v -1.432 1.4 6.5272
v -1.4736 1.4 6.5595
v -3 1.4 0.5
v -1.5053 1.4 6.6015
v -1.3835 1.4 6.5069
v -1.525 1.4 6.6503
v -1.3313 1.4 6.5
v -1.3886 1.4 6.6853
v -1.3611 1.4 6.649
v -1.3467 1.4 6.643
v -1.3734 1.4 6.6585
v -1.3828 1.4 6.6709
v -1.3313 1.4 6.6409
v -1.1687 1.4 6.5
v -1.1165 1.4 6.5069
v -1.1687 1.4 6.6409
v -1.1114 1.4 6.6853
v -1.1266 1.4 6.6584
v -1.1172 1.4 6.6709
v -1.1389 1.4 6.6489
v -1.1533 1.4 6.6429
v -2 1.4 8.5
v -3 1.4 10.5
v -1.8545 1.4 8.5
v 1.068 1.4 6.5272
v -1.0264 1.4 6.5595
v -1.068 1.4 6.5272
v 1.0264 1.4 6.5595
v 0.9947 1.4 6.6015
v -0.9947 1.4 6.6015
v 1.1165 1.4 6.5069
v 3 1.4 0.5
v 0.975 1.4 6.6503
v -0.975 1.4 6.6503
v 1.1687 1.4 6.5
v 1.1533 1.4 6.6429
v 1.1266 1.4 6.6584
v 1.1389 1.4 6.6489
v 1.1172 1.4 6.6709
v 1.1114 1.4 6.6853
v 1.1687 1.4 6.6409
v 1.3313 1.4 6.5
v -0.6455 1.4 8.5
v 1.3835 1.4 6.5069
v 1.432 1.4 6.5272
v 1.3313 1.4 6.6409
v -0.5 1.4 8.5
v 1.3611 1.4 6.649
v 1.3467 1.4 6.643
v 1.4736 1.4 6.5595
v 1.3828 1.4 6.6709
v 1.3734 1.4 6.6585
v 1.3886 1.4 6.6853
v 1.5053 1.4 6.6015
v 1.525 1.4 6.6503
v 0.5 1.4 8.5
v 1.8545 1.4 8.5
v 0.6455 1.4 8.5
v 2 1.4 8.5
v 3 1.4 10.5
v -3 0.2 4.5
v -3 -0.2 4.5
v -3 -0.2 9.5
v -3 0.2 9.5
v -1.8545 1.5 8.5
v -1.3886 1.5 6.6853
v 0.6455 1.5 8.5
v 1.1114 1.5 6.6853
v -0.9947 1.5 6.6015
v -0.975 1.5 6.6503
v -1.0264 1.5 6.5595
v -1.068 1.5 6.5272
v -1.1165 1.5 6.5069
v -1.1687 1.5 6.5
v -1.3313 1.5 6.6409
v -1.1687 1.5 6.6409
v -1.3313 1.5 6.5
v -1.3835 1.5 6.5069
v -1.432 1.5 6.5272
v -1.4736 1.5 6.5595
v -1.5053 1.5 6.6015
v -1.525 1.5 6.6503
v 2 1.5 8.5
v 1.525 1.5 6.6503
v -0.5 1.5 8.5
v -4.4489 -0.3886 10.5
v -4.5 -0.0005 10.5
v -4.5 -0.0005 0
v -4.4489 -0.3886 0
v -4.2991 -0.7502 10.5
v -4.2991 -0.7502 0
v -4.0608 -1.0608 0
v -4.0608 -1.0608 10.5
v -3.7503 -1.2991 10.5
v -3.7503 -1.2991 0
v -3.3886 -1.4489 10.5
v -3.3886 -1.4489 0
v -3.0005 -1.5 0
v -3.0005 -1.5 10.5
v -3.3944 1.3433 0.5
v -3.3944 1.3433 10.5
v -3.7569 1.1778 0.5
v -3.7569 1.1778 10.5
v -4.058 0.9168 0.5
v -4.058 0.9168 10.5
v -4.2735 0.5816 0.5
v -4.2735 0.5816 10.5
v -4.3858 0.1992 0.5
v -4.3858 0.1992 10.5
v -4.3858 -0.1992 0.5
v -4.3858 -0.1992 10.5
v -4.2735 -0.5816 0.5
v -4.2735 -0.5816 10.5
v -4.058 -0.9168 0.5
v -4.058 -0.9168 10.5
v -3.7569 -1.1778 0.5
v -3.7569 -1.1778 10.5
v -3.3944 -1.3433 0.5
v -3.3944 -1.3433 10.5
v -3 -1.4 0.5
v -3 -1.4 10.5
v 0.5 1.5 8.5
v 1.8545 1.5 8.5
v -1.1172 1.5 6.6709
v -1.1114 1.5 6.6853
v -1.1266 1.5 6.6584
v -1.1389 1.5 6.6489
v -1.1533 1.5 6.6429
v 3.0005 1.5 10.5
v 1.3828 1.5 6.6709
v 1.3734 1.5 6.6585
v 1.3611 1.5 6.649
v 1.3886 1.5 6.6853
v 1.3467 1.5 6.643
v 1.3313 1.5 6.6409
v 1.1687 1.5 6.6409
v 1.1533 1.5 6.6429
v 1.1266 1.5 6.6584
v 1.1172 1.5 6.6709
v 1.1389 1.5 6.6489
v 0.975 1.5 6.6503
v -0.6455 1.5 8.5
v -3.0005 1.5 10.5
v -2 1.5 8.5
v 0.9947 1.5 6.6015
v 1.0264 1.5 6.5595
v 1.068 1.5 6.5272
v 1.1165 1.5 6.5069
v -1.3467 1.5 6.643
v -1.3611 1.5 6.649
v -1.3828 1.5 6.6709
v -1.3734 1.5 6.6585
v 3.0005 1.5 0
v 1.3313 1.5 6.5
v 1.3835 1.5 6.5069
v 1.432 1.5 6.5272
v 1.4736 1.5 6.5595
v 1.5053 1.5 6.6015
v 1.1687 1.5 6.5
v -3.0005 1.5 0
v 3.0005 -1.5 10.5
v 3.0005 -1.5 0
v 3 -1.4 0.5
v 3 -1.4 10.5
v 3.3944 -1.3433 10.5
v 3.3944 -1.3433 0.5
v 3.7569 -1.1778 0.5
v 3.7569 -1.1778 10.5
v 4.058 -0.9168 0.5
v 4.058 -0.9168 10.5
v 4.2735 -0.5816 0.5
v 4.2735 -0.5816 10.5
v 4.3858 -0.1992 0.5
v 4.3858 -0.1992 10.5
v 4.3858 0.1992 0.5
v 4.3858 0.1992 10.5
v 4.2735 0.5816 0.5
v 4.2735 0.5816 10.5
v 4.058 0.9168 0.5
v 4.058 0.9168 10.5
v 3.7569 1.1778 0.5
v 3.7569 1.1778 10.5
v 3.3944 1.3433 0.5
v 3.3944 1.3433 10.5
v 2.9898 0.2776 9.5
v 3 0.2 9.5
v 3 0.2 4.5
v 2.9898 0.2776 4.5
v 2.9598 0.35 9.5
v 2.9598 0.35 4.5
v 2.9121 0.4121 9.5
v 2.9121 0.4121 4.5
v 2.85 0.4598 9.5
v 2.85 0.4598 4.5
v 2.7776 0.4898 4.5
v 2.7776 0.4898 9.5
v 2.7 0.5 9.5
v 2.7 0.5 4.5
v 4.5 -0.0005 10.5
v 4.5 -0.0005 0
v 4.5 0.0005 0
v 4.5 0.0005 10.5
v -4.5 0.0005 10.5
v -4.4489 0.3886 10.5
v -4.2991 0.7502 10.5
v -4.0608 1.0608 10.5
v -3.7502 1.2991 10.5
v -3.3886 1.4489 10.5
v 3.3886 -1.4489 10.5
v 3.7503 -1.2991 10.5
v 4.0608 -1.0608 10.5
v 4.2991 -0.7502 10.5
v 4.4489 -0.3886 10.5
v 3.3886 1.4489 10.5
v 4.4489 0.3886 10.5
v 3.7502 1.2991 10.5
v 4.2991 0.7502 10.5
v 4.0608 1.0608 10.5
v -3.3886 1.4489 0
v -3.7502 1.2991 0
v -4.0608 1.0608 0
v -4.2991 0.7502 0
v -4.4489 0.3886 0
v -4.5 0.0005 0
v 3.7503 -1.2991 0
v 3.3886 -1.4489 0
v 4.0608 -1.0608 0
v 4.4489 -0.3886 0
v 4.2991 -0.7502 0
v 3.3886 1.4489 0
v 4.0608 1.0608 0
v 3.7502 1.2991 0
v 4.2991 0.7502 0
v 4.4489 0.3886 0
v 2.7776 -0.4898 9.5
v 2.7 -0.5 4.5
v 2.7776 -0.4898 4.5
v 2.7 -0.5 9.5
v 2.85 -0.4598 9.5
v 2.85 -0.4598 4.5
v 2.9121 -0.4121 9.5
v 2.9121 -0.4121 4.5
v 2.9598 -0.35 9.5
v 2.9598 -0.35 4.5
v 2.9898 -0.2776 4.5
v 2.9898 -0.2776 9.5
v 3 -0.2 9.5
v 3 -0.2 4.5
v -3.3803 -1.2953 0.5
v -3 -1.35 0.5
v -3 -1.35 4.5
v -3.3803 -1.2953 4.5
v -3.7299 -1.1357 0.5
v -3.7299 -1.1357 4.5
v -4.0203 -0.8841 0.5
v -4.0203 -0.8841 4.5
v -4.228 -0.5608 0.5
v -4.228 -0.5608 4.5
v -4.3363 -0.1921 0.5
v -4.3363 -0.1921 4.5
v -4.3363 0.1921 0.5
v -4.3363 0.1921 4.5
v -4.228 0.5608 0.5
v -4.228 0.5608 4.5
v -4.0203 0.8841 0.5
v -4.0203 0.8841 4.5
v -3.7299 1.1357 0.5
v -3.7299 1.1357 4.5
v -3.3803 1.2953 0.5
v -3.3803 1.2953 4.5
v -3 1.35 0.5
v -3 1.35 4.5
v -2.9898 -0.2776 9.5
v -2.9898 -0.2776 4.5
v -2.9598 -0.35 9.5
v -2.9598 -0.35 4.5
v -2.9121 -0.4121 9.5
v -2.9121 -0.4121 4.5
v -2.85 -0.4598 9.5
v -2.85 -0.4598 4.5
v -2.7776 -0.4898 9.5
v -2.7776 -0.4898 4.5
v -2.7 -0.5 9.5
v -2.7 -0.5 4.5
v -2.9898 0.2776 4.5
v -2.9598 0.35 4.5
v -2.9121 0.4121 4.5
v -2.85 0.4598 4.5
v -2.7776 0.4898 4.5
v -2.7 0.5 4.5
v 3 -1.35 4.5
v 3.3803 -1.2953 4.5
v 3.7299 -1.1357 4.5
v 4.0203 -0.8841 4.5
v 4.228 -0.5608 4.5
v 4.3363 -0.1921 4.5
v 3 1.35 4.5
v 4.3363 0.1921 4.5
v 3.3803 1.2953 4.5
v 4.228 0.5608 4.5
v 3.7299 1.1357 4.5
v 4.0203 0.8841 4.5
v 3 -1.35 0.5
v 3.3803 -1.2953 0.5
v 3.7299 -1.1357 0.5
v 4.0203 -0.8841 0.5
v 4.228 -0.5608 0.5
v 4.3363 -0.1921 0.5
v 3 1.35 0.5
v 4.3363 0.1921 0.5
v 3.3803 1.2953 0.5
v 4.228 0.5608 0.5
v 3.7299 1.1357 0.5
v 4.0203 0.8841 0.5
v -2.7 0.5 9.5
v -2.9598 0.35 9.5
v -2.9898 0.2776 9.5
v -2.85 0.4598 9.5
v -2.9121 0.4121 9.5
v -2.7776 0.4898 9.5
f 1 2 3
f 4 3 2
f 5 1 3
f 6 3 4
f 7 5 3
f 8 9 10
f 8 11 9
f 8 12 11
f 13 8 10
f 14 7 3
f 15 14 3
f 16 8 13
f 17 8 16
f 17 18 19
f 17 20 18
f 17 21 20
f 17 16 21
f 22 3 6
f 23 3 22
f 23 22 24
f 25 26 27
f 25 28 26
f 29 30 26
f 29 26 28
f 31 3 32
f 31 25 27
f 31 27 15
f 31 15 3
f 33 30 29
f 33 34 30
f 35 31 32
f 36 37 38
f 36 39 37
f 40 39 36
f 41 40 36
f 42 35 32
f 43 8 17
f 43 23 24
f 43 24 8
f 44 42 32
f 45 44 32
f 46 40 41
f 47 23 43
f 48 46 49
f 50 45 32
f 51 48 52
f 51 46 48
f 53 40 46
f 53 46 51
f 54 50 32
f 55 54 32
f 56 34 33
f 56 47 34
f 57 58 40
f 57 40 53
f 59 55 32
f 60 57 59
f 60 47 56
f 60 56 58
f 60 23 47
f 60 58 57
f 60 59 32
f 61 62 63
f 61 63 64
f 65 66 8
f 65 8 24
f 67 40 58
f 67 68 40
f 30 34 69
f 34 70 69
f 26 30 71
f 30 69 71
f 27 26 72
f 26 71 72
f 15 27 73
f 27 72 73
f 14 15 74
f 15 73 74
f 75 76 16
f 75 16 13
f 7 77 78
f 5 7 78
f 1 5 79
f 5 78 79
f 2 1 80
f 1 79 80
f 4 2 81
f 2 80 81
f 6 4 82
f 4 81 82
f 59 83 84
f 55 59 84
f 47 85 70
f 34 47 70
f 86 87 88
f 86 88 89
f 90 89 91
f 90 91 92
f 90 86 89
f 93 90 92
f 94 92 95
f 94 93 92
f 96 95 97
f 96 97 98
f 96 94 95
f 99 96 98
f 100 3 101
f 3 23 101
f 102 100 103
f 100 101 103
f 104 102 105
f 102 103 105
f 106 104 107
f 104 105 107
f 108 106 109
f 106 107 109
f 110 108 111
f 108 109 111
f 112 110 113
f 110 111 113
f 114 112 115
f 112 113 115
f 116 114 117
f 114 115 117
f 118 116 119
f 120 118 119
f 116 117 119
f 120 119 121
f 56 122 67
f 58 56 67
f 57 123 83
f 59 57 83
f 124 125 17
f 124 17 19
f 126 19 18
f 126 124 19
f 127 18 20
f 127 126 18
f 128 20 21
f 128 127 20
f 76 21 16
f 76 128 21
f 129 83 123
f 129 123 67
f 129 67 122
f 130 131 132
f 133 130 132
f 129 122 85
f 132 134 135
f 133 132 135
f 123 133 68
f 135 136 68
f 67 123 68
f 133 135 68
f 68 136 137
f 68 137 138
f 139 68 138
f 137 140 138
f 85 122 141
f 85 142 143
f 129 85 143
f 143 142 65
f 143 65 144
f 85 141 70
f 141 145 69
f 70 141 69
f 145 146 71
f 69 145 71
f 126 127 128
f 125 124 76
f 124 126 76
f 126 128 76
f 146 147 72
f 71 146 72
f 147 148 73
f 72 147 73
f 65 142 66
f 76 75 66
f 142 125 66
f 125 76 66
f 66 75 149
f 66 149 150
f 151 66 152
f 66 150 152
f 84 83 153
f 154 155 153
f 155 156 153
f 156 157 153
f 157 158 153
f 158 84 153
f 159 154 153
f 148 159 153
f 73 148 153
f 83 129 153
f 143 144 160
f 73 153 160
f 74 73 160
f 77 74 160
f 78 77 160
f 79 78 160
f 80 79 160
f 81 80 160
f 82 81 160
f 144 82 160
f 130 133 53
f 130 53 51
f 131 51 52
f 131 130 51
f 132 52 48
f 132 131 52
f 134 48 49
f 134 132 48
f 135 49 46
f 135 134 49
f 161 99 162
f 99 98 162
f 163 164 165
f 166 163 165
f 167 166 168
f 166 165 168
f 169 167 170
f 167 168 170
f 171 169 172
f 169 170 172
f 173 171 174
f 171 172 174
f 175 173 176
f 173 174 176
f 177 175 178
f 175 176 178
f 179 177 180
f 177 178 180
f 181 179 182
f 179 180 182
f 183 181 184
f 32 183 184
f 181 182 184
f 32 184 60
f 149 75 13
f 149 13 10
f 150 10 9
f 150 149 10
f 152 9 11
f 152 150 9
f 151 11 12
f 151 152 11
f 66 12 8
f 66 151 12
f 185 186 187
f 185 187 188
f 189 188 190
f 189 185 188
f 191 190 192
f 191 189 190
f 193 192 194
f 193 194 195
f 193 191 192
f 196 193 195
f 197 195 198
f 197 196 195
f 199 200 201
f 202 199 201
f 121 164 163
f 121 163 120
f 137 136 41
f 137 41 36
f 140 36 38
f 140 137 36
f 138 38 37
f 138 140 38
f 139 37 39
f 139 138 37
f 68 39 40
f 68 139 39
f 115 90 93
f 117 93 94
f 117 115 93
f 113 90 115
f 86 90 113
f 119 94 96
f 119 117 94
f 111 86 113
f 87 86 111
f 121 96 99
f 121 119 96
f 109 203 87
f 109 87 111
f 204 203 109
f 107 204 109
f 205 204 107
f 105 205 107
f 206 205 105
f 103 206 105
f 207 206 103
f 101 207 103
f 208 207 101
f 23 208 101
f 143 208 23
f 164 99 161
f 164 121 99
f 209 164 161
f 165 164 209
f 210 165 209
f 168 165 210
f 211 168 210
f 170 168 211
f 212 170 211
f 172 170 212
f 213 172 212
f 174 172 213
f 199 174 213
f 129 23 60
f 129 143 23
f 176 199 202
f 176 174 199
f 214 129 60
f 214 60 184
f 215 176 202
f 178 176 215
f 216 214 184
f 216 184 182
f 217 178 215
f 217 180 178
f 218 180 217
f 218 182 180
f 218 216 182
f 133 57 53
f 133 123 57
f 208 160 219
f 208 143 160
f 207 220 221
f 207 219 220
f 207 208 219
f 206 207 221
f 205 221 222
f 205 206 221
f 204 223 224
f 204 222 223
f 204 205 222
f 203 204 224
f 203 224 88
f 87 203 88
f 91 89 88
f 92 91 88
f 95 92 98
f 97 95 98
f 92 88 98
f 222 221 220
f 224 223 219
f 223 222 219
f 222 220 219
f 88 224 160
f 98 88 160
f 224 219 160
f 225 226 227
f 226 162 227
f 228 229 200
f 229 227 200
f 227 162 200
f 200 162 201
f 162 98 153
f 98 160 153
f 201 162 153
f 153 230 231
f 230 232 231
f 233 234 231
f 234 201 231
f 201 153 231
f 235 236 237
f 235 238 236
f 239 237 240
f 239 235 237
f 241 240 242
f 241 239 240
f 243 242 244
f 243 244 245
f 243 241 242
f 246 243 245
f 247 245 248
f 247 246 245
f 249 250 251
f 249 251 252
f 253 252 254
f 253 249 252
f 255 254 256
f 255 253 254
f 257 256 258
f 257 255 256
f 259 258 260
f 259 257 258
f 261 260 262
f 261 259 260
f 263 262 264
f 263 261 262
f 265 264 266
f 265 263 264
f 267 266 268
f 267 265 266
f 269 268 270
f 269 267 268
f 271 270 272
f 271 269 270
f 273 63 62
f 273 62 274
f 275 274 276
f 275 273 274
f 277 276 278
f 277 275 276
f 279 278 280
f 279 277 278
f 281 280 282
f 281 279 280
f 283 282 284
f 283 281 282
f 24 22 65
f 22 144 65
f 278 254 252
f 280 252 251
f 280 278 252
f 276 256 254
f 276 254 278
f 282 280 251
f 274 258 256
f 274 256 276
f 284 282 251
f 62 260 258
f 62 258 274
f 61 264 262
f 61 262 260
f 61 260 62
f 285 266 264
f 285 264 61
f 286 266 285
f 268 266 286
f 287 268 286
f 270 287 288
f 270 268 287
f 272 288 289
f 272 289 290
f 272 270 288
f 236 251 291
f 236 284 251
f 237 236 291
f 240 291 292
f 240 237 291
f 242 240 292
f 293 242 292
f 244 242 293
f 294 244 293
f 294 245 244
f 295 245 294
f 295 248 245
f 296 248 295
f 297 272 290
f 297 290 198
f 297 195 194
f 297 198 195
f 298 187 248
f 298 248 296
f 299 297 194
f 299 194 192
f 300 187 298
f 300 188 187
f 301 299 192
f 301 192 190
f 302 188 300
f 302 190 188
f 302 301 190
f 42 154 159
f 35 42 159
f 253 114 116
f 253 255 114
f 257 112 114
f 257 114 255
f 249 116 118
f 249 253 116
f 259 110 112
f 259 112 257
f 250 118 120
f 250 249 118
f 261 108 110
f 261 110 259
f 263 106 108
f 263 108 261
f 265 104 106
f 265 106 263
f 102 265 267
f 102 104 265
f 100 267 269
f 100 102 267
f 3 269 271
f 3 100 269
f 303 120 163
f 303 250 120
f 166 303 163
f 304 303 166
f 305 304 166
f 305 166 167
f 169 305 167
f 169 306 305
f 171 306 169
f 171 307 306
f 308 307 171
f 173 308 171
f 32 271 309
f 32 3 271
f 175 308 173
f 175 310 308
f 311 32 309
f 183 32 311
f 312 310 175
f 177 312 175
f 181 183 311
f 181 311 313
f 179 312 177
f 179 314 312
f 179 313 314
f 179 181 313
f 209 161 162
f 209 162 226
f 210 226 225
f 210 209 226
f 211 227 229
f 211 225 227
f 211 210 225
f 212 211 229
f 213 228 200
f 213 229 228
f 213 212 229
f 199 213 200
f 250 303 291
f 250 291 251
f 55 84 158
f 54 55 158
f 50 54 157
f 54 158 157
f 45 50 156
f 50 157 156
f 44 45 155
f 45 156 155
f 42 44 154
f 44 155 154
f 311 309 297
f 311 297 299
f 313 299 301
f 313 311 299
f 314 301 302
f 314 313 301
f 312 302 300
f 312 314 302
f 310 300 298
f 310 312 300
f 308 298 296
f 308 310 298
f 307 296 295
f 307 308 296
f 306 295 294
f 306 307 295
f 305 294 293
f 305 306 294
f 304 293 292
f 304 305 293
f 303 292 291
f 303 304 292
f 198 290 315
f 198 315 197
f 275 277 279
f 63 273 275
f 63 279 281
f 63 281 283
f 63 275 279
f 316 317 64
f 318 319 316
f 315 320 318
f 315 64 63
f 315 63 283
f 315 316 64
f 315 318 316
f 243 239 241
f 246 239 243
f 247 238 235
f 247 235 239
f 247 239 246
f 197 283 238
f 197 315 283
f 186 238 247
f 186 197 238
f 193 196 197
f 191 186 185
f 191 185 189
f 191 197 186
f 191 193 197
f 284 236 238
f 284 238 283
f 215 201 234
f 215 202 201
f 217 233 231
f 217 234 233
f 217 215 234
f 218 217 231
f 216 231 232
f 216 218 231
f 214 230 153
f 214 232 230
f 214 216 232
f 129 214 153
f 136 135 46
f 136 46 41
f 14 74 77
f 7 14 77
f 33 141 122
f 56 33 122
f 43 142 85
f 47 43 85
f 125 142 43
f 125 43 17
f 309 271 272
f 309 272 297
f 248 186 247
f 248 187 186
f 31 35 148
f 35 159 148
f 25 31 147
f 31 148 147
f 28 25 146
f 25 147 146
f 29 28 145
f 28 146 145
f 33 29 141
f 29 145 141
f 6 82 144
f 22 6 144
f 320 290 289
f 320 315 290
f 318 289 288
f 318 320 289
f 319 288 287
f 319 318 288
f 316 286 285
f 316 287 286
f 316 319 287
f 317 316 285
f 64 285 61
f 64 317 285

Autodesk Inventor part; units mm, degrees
ref_plane "YZ Plane" through (0, 0, 0) normal (1, 0, 0) x (0, 1, 0)
ref_plane "XZ Plane" through (0, 0, 0) normal (0, 1, 0) x (-1, 0, 0)
ref_plane "XY Plane" through (0, 0, 0) normal (0, 0, 1) x (1, 0, 0)
sketch "Sketch1" plane through (0, 0, 0) normal (0, 0, 1) x (1, 0, 0)
  line L0 (-4.5, -1.5) -> (4.5, -1.5)
  line L1 (4.5, -1.5) -> (4.5, 1.5)
  line L2 (4.5, 1.5) -> (-4.5, 1.5)
  line L3 (-4.5, 1.5) -> (-4.5, -1.5)
  point P0 (0, 0)
  dimension "d0" = 3
  dimension "d1" = 1.5
  dimension "d2" = 9
  dimension "d3" = 4.5
extrude "Extrusion1" add sketch "Sketch1" along normal blind 10.5
fillet "Fillet1" radius 1.5 4 edges at (4.5, 1.5, 5.25) (4.5, -1.5, 5.25) (-4.5, -1.5, 5.25) (-4.5, 1.5, 5.25)
sketch "Sketch2" plane through (0, 0, 10.5) normal (0, 0, 1) x (1, 0, 0)
  arc A0 (-3, 1.5) -> (-3, -1.5) centre (-3, 0) ccw projected
  line L0 (-3, -1.5) -> (3, -1.5) projected
  arc A1 (3, -1.5) -> (3, 1.5) centre (3, 0) ccw projected
  line L1 (3, 1.5) -> (-3, 1.5) projected
  arc A2 (-3, 1.4) -> (-3, -1.4) centre (-3, 0) ccw
  line L2 (-3, 1.4) -> (3, 1.4)
  arc A3 (3, -1.4) -> (3, 1.4) centre (3, 0) ccw
  line L3 (3, -1.4) -> (-3, -1.4)
  point P0 (0, 0)
  dimension "d7" = 0.1
extrude "Extrusion2" cut sketch "Sketch2" against normal blind 10 contours L2 A3 L3 A2
sketch "Sketch4" plane through (-3, 1.5, 0) normal (0, 1, 0) x (1, 0, 0)
  line L0 (2.5, -8.5) -> (2.025, -6.6503)
  line L1 (1.8313, -6.5) -> (1.6687, -6.5)
  line L2 (1.475, -6.6503) -> (1, -8.5)
  line L3 (6, -10.5) -> (0, -10.5) projected
  arc A0 (1.6687, -6.5) -> (1.475, -6.6503) centre (1.6687, -6.7) ccw
  arc A1 (2.025, -6.6503) -> (1.8313, -6.5) centre (1.8313, -6.7) ccw
  line L4 (2.3545, -8.5) -> (1.8886, -6.6853)
  arc A2 (1.8886, -6.6853) -> (1.8313, -6.6409) centre (1.8313, -6.7) ccw
  line L5 (1.8313, -6.6409) -> (1.6687, -6.6409)
  arc A3 (1.6687, -6.6409) -> (1.6114, -6.6853) centre (1.6687, -6.7) ccw
  line L6 (1.6114, -6.6853) -> (1.1455, -8.5)
  line L7 (1, -8.5) -> (1.1455, -8.5)
  line L8 (2.3545, -8.5) -> (2.5, -8.5)
  point P0 (3, 0)
  point P1 (1.9865, -6.5)
  point P2 (1.5135, -6.5)
  dimension "d11" = 0.5135
  dimension "d12" = 0.5135
  dimension "d13" = 1.5
  dimension "d14" = 2
  dimension "d15" = 2
  dimension "d16" = 1
  dimension "d17" = 0.4729
  dimension "d18" = 0.2
extrude "Extrusion3" cut sketch "Sketch4" against normal blind 1
mirror "Mirror2" about plane through (0, 0, 0) normal (1, 0, 0) of "Extrusion3"
sketch "Sketch5" plane through (0, 0, 0.5) normal (0, 0, 1) x (1, 0, 0)
  arc A0 (-3, 1.4) -> (-3, -1.4) centre (-3, 0) ccw projected
  line L0 (3, -1.4) -> (-3, -1.4) projected
  arc A1 (3, -1.4) -> (3, 1.4) centre (3, 0) ccw projected
  line L1 (-3, 1.4) -> (3, 1.4) projected
  arc A2 (-3, 1.35) -> (-3, -1.35) centre (-3, 0) ccw
  line L2 (-3, 1.35) -> (3, 1.35)
  arc A3 (3, -1.35) -> (3, 1.35) centre (3, 0) ccw
  line L3 (3, -1.35) -> (-3, -1.35)
  point P0 (0, 0)
  dimension "d21" = 0.05
extrude "Extrusion4" add sketch "Sketch5" along normal blind 4 contours L2 A3 L3 A2
sketch "Sketch6" plane through (0, 0, 4.5) normal (0, 0, 1) x (1, 0, 0)
  line L0 (-3, 0.5) -> (3, 0.5)
  line L1 (3, 0.5) -> (3, -0.5)
  line L2 (3, -0.5) -> (-3, -0.5)
  line L3 (-3, -0.5) -> (-3, 0.5)
  point P0 (0, 0)
  dimension "d24" = 1
  dimension "d25" = 0.5
  dimension "d26" = 6
  dimension "d27" = 3
extrude "Extrusion5" add sketch "Sketch6" along normal blind 5
fillet "Fillet2" radius 0.3 4 edges at (-3, 0.5, 7) (-3, -0.5, 7) (3, 0.5, 7) (3, -0.5, 7)
equation "\"d1\" = 0.5 * d0"
equation "\"d3\" = 0.5 * d2"
equation "\"d12\" = d11"
equation "\"d25\" = 0.5 * d24"
equation "\"d27\" = 0.5 * d26"
properties part number "XGEN_USB-C_socket_pcb"
